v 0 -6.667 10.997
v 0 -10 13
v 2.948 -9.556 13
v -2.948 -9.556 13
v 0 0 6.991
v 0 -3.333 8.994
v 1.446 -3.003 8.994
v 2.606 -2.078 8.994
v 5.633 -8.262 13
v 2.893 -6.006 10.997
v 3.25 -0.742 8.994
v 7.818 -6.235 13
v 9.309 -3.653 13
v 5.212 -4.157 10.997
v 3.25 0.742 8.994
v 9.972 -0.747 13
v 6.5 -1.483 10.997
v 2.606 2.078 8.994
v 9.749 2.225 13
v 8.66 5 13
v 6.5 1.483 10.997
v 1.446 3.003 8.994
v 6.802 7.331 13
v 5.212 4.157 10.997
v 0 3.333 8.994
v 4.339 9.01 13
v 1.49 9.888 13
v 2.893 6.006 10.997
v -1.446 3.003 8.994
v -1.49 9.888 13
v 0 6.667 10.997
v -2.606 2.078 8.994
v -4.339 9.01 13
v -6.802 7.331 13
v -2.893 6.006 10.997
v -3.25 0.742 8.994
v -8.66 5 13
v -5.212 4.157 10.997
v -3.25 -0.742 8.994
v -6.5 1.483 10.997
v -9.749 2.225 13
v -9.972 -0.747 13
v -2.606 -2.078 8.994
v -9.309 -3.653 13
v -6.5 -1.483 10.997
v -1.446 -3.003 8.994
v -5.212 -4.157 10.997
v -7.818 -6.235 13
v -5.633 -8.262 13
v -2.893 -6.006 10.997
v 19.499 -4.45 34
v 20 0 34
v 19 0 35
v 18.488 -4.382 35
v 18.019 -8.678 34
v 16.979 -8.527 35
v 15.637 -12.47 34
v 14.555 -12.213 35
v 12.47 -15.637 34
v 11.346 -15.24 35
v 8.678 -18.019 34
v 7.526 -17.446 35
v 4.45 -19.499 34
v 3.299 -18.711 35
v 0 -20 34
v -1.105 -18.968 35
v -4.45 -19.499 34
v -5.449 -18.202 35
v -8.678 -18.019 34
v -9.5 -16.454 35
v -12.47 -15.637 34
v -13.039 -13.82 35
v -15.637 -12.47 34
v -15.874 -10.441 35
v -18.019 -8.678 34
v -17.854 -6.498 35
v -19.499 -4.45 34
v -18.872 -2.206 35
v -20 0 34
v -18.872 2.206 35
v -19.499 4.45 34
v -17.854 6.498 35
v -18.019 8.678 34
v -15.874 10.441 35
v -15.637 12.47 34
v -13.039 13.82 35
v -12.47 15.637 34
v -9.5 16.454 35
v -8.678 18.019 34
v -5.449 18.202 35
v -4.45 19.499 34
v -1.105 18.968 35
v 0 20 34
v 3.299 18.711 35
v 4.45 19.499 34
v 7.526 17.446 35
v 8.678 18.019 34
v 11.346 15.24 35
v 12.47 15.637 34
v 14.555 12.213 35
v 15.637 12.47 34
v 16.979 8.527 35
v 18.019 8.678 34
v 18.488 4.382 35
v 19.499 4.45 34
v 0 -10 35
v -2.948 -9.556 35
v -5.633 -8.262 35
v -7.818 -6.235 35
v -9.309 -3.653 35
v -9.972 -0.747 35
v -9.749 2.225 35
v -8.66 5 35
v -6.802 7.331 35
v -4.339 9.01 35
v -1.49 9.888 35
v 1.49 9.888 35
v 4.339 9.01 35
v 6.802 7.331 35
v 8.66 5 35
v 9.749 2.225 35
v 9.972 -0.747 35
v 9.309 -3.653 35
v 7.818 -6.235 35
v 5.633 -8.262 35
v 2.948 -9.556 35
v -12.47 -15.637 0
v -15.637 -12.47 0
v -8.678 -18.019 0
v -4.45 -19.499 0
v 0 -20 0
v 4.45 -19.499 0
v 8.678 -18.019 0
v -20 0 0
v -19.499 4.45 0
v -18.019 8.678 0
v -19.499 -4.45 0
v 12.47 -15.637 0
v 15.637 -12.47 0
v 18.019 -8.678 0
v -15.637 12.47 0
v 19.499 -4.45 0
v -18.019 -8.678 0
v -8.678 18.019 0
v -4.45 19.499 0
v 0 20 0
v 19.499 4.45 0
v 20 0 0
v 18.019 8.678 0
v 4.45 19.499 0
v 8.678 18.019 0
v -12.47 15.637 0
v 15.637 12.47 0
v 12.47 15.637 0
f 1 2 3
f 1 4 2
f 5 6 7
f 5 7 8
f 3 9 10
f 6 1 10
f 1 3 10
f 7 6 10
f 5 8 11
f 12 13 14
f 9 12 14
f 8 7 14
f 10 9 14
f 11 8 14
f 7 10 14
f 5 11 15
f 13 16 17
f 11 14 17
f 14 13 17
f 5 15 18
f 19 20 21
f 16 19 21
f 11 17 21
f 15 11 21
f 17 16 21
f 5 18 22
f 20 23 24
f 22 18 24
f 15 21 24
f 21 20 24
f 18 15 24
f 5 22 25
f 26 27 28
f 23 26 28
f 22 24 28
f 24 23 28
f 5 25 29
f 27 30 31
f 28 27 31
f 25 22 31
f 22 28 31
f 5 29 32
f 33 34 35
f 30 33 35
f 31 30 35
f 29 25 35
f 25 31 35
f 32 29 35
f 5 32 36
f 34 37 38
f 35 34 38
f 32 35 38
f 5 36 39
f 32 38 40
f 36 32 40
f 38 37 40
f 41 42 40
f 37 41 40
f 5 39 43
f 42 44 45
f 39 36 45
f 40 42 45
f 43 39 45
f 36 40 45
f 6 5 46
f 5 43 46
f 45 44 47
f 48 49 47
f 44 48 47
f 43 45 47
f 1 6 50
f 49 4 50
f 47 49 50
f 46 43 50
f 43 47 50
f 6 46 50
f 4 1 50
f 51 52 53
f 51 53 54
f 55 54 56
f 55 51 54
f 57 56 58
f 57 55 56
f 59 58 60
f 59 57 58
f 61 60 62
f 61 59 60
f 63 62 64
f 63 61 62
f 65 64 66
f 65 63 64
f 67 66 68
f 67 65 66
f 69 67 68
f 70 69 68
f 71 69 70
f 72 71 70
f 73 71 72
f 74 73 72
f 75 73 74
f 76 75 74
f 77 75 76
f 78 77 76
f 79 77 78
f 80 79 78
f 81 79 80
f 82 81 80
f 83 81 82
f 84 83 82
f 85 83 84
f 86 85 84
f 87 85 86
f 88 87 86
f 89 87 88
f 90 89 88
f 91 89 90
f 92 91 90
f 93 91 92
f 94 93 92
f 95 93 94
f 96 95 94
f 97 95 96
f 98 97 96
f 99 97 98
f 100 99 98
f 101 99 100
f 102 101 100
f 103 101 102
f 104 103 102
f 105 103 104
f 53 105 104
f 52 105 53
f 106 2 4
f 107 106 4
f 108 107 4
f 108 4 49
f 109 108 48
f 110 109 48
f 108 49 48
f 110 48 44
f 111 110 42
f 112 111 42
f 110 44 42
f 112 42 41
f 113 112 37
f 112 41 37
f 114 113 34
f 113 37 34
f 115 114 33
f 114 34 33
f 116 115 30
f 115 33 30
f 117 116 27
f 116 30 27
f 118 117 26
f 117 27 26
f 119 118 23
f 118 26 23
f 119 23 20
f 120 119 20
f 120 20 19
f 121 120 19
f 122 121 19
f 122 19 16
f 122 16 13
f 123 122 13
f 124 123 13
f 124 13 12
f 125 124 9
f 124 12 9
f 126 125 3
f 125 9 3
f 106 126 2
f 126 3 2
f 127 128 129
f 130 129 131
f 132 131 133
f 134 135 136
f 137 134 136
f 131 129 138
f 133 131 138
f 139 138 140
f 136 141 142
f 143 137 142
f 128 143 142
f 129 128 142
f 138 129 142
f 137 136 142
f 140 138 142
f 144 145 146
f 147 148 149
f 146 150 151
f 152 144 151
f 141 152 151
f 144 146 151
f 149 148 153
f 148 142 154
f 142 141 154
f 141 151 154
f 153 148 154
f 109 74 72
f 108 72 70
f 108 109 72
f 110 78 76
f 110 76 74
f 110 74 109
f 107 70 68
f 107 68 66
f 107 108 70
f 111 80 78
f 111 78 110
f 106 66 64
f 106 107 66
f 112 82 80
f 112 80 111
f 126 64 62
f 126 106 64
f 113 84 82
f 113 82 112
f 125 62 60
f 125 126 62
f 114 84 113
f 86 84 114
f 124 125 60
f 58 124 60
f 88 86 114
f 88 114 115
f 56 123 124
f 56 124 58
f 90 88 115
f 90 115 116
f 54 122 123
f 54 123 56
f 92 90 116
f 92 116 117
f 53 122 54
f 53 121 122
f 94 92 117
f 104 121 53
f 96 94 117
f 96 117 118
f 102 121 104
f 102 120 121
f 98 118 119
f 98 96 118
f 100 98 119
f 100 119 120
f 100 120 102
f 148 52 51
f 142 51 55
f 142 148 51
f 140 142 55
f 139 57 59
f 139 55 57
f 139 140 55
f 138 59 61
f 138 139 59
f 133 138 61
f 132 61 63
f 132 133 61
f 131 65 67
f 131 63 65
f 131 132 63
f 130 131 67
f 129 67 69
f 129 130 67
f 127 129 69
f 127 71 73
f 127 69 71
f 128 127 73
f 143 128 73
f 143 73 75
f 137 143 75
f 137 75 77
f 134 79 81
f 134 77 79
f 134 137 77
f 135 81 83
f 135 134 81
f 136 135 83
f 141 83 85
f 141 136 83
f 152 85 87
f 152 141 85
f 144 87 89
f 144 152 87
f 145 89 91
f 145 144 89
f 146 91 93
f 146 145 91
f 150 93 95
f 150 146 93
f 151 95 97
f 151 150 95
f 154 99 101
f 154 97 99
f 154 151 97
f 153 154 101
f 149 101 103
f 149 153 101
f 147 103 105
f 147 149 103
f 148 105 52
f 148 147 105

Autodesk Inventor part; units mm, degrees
ref_plane "YZ Plane" through (0, 0, 0) normal (1, 0, 0) x (0, 1, 0)
ref_plane "XZ Plane" through (0, 0, 0) normal (0, 1, 0) x (-1, 0, 0)
ref_plane "XY Plane" through (0, 0, 0) normal (0, 0, 1) x (1, 0, 0)
sketch "Sketch1" plane through (0, 0, 0) normal (0, 0, 1) x (1, 0, 0)
  circle A0 centre (0, 0) radius 20
  dimension "d0" = 40
extrude "Extrusion1" add sketch "Sketch1" along normal blind 35
sketch "Sketch5" plane through (0, 0, 35) normal (0, 0, 1) x (1, 0, 0)
  point P0 (0, 0)
  point P1 (0, 0)
hole "Hole2" at (0, 0, 35) direction (0, 0, -1) diameter 20 depth 22 tip angle 118
thread "Thread2" size "M20x2.5" class "6H" standard "ANSI Metric M Profile" full length
chamfer "Chamfer1" distance 1 angle 45 1 edges at (-20, 0, 35)
properties part number "CompressionGrip"
